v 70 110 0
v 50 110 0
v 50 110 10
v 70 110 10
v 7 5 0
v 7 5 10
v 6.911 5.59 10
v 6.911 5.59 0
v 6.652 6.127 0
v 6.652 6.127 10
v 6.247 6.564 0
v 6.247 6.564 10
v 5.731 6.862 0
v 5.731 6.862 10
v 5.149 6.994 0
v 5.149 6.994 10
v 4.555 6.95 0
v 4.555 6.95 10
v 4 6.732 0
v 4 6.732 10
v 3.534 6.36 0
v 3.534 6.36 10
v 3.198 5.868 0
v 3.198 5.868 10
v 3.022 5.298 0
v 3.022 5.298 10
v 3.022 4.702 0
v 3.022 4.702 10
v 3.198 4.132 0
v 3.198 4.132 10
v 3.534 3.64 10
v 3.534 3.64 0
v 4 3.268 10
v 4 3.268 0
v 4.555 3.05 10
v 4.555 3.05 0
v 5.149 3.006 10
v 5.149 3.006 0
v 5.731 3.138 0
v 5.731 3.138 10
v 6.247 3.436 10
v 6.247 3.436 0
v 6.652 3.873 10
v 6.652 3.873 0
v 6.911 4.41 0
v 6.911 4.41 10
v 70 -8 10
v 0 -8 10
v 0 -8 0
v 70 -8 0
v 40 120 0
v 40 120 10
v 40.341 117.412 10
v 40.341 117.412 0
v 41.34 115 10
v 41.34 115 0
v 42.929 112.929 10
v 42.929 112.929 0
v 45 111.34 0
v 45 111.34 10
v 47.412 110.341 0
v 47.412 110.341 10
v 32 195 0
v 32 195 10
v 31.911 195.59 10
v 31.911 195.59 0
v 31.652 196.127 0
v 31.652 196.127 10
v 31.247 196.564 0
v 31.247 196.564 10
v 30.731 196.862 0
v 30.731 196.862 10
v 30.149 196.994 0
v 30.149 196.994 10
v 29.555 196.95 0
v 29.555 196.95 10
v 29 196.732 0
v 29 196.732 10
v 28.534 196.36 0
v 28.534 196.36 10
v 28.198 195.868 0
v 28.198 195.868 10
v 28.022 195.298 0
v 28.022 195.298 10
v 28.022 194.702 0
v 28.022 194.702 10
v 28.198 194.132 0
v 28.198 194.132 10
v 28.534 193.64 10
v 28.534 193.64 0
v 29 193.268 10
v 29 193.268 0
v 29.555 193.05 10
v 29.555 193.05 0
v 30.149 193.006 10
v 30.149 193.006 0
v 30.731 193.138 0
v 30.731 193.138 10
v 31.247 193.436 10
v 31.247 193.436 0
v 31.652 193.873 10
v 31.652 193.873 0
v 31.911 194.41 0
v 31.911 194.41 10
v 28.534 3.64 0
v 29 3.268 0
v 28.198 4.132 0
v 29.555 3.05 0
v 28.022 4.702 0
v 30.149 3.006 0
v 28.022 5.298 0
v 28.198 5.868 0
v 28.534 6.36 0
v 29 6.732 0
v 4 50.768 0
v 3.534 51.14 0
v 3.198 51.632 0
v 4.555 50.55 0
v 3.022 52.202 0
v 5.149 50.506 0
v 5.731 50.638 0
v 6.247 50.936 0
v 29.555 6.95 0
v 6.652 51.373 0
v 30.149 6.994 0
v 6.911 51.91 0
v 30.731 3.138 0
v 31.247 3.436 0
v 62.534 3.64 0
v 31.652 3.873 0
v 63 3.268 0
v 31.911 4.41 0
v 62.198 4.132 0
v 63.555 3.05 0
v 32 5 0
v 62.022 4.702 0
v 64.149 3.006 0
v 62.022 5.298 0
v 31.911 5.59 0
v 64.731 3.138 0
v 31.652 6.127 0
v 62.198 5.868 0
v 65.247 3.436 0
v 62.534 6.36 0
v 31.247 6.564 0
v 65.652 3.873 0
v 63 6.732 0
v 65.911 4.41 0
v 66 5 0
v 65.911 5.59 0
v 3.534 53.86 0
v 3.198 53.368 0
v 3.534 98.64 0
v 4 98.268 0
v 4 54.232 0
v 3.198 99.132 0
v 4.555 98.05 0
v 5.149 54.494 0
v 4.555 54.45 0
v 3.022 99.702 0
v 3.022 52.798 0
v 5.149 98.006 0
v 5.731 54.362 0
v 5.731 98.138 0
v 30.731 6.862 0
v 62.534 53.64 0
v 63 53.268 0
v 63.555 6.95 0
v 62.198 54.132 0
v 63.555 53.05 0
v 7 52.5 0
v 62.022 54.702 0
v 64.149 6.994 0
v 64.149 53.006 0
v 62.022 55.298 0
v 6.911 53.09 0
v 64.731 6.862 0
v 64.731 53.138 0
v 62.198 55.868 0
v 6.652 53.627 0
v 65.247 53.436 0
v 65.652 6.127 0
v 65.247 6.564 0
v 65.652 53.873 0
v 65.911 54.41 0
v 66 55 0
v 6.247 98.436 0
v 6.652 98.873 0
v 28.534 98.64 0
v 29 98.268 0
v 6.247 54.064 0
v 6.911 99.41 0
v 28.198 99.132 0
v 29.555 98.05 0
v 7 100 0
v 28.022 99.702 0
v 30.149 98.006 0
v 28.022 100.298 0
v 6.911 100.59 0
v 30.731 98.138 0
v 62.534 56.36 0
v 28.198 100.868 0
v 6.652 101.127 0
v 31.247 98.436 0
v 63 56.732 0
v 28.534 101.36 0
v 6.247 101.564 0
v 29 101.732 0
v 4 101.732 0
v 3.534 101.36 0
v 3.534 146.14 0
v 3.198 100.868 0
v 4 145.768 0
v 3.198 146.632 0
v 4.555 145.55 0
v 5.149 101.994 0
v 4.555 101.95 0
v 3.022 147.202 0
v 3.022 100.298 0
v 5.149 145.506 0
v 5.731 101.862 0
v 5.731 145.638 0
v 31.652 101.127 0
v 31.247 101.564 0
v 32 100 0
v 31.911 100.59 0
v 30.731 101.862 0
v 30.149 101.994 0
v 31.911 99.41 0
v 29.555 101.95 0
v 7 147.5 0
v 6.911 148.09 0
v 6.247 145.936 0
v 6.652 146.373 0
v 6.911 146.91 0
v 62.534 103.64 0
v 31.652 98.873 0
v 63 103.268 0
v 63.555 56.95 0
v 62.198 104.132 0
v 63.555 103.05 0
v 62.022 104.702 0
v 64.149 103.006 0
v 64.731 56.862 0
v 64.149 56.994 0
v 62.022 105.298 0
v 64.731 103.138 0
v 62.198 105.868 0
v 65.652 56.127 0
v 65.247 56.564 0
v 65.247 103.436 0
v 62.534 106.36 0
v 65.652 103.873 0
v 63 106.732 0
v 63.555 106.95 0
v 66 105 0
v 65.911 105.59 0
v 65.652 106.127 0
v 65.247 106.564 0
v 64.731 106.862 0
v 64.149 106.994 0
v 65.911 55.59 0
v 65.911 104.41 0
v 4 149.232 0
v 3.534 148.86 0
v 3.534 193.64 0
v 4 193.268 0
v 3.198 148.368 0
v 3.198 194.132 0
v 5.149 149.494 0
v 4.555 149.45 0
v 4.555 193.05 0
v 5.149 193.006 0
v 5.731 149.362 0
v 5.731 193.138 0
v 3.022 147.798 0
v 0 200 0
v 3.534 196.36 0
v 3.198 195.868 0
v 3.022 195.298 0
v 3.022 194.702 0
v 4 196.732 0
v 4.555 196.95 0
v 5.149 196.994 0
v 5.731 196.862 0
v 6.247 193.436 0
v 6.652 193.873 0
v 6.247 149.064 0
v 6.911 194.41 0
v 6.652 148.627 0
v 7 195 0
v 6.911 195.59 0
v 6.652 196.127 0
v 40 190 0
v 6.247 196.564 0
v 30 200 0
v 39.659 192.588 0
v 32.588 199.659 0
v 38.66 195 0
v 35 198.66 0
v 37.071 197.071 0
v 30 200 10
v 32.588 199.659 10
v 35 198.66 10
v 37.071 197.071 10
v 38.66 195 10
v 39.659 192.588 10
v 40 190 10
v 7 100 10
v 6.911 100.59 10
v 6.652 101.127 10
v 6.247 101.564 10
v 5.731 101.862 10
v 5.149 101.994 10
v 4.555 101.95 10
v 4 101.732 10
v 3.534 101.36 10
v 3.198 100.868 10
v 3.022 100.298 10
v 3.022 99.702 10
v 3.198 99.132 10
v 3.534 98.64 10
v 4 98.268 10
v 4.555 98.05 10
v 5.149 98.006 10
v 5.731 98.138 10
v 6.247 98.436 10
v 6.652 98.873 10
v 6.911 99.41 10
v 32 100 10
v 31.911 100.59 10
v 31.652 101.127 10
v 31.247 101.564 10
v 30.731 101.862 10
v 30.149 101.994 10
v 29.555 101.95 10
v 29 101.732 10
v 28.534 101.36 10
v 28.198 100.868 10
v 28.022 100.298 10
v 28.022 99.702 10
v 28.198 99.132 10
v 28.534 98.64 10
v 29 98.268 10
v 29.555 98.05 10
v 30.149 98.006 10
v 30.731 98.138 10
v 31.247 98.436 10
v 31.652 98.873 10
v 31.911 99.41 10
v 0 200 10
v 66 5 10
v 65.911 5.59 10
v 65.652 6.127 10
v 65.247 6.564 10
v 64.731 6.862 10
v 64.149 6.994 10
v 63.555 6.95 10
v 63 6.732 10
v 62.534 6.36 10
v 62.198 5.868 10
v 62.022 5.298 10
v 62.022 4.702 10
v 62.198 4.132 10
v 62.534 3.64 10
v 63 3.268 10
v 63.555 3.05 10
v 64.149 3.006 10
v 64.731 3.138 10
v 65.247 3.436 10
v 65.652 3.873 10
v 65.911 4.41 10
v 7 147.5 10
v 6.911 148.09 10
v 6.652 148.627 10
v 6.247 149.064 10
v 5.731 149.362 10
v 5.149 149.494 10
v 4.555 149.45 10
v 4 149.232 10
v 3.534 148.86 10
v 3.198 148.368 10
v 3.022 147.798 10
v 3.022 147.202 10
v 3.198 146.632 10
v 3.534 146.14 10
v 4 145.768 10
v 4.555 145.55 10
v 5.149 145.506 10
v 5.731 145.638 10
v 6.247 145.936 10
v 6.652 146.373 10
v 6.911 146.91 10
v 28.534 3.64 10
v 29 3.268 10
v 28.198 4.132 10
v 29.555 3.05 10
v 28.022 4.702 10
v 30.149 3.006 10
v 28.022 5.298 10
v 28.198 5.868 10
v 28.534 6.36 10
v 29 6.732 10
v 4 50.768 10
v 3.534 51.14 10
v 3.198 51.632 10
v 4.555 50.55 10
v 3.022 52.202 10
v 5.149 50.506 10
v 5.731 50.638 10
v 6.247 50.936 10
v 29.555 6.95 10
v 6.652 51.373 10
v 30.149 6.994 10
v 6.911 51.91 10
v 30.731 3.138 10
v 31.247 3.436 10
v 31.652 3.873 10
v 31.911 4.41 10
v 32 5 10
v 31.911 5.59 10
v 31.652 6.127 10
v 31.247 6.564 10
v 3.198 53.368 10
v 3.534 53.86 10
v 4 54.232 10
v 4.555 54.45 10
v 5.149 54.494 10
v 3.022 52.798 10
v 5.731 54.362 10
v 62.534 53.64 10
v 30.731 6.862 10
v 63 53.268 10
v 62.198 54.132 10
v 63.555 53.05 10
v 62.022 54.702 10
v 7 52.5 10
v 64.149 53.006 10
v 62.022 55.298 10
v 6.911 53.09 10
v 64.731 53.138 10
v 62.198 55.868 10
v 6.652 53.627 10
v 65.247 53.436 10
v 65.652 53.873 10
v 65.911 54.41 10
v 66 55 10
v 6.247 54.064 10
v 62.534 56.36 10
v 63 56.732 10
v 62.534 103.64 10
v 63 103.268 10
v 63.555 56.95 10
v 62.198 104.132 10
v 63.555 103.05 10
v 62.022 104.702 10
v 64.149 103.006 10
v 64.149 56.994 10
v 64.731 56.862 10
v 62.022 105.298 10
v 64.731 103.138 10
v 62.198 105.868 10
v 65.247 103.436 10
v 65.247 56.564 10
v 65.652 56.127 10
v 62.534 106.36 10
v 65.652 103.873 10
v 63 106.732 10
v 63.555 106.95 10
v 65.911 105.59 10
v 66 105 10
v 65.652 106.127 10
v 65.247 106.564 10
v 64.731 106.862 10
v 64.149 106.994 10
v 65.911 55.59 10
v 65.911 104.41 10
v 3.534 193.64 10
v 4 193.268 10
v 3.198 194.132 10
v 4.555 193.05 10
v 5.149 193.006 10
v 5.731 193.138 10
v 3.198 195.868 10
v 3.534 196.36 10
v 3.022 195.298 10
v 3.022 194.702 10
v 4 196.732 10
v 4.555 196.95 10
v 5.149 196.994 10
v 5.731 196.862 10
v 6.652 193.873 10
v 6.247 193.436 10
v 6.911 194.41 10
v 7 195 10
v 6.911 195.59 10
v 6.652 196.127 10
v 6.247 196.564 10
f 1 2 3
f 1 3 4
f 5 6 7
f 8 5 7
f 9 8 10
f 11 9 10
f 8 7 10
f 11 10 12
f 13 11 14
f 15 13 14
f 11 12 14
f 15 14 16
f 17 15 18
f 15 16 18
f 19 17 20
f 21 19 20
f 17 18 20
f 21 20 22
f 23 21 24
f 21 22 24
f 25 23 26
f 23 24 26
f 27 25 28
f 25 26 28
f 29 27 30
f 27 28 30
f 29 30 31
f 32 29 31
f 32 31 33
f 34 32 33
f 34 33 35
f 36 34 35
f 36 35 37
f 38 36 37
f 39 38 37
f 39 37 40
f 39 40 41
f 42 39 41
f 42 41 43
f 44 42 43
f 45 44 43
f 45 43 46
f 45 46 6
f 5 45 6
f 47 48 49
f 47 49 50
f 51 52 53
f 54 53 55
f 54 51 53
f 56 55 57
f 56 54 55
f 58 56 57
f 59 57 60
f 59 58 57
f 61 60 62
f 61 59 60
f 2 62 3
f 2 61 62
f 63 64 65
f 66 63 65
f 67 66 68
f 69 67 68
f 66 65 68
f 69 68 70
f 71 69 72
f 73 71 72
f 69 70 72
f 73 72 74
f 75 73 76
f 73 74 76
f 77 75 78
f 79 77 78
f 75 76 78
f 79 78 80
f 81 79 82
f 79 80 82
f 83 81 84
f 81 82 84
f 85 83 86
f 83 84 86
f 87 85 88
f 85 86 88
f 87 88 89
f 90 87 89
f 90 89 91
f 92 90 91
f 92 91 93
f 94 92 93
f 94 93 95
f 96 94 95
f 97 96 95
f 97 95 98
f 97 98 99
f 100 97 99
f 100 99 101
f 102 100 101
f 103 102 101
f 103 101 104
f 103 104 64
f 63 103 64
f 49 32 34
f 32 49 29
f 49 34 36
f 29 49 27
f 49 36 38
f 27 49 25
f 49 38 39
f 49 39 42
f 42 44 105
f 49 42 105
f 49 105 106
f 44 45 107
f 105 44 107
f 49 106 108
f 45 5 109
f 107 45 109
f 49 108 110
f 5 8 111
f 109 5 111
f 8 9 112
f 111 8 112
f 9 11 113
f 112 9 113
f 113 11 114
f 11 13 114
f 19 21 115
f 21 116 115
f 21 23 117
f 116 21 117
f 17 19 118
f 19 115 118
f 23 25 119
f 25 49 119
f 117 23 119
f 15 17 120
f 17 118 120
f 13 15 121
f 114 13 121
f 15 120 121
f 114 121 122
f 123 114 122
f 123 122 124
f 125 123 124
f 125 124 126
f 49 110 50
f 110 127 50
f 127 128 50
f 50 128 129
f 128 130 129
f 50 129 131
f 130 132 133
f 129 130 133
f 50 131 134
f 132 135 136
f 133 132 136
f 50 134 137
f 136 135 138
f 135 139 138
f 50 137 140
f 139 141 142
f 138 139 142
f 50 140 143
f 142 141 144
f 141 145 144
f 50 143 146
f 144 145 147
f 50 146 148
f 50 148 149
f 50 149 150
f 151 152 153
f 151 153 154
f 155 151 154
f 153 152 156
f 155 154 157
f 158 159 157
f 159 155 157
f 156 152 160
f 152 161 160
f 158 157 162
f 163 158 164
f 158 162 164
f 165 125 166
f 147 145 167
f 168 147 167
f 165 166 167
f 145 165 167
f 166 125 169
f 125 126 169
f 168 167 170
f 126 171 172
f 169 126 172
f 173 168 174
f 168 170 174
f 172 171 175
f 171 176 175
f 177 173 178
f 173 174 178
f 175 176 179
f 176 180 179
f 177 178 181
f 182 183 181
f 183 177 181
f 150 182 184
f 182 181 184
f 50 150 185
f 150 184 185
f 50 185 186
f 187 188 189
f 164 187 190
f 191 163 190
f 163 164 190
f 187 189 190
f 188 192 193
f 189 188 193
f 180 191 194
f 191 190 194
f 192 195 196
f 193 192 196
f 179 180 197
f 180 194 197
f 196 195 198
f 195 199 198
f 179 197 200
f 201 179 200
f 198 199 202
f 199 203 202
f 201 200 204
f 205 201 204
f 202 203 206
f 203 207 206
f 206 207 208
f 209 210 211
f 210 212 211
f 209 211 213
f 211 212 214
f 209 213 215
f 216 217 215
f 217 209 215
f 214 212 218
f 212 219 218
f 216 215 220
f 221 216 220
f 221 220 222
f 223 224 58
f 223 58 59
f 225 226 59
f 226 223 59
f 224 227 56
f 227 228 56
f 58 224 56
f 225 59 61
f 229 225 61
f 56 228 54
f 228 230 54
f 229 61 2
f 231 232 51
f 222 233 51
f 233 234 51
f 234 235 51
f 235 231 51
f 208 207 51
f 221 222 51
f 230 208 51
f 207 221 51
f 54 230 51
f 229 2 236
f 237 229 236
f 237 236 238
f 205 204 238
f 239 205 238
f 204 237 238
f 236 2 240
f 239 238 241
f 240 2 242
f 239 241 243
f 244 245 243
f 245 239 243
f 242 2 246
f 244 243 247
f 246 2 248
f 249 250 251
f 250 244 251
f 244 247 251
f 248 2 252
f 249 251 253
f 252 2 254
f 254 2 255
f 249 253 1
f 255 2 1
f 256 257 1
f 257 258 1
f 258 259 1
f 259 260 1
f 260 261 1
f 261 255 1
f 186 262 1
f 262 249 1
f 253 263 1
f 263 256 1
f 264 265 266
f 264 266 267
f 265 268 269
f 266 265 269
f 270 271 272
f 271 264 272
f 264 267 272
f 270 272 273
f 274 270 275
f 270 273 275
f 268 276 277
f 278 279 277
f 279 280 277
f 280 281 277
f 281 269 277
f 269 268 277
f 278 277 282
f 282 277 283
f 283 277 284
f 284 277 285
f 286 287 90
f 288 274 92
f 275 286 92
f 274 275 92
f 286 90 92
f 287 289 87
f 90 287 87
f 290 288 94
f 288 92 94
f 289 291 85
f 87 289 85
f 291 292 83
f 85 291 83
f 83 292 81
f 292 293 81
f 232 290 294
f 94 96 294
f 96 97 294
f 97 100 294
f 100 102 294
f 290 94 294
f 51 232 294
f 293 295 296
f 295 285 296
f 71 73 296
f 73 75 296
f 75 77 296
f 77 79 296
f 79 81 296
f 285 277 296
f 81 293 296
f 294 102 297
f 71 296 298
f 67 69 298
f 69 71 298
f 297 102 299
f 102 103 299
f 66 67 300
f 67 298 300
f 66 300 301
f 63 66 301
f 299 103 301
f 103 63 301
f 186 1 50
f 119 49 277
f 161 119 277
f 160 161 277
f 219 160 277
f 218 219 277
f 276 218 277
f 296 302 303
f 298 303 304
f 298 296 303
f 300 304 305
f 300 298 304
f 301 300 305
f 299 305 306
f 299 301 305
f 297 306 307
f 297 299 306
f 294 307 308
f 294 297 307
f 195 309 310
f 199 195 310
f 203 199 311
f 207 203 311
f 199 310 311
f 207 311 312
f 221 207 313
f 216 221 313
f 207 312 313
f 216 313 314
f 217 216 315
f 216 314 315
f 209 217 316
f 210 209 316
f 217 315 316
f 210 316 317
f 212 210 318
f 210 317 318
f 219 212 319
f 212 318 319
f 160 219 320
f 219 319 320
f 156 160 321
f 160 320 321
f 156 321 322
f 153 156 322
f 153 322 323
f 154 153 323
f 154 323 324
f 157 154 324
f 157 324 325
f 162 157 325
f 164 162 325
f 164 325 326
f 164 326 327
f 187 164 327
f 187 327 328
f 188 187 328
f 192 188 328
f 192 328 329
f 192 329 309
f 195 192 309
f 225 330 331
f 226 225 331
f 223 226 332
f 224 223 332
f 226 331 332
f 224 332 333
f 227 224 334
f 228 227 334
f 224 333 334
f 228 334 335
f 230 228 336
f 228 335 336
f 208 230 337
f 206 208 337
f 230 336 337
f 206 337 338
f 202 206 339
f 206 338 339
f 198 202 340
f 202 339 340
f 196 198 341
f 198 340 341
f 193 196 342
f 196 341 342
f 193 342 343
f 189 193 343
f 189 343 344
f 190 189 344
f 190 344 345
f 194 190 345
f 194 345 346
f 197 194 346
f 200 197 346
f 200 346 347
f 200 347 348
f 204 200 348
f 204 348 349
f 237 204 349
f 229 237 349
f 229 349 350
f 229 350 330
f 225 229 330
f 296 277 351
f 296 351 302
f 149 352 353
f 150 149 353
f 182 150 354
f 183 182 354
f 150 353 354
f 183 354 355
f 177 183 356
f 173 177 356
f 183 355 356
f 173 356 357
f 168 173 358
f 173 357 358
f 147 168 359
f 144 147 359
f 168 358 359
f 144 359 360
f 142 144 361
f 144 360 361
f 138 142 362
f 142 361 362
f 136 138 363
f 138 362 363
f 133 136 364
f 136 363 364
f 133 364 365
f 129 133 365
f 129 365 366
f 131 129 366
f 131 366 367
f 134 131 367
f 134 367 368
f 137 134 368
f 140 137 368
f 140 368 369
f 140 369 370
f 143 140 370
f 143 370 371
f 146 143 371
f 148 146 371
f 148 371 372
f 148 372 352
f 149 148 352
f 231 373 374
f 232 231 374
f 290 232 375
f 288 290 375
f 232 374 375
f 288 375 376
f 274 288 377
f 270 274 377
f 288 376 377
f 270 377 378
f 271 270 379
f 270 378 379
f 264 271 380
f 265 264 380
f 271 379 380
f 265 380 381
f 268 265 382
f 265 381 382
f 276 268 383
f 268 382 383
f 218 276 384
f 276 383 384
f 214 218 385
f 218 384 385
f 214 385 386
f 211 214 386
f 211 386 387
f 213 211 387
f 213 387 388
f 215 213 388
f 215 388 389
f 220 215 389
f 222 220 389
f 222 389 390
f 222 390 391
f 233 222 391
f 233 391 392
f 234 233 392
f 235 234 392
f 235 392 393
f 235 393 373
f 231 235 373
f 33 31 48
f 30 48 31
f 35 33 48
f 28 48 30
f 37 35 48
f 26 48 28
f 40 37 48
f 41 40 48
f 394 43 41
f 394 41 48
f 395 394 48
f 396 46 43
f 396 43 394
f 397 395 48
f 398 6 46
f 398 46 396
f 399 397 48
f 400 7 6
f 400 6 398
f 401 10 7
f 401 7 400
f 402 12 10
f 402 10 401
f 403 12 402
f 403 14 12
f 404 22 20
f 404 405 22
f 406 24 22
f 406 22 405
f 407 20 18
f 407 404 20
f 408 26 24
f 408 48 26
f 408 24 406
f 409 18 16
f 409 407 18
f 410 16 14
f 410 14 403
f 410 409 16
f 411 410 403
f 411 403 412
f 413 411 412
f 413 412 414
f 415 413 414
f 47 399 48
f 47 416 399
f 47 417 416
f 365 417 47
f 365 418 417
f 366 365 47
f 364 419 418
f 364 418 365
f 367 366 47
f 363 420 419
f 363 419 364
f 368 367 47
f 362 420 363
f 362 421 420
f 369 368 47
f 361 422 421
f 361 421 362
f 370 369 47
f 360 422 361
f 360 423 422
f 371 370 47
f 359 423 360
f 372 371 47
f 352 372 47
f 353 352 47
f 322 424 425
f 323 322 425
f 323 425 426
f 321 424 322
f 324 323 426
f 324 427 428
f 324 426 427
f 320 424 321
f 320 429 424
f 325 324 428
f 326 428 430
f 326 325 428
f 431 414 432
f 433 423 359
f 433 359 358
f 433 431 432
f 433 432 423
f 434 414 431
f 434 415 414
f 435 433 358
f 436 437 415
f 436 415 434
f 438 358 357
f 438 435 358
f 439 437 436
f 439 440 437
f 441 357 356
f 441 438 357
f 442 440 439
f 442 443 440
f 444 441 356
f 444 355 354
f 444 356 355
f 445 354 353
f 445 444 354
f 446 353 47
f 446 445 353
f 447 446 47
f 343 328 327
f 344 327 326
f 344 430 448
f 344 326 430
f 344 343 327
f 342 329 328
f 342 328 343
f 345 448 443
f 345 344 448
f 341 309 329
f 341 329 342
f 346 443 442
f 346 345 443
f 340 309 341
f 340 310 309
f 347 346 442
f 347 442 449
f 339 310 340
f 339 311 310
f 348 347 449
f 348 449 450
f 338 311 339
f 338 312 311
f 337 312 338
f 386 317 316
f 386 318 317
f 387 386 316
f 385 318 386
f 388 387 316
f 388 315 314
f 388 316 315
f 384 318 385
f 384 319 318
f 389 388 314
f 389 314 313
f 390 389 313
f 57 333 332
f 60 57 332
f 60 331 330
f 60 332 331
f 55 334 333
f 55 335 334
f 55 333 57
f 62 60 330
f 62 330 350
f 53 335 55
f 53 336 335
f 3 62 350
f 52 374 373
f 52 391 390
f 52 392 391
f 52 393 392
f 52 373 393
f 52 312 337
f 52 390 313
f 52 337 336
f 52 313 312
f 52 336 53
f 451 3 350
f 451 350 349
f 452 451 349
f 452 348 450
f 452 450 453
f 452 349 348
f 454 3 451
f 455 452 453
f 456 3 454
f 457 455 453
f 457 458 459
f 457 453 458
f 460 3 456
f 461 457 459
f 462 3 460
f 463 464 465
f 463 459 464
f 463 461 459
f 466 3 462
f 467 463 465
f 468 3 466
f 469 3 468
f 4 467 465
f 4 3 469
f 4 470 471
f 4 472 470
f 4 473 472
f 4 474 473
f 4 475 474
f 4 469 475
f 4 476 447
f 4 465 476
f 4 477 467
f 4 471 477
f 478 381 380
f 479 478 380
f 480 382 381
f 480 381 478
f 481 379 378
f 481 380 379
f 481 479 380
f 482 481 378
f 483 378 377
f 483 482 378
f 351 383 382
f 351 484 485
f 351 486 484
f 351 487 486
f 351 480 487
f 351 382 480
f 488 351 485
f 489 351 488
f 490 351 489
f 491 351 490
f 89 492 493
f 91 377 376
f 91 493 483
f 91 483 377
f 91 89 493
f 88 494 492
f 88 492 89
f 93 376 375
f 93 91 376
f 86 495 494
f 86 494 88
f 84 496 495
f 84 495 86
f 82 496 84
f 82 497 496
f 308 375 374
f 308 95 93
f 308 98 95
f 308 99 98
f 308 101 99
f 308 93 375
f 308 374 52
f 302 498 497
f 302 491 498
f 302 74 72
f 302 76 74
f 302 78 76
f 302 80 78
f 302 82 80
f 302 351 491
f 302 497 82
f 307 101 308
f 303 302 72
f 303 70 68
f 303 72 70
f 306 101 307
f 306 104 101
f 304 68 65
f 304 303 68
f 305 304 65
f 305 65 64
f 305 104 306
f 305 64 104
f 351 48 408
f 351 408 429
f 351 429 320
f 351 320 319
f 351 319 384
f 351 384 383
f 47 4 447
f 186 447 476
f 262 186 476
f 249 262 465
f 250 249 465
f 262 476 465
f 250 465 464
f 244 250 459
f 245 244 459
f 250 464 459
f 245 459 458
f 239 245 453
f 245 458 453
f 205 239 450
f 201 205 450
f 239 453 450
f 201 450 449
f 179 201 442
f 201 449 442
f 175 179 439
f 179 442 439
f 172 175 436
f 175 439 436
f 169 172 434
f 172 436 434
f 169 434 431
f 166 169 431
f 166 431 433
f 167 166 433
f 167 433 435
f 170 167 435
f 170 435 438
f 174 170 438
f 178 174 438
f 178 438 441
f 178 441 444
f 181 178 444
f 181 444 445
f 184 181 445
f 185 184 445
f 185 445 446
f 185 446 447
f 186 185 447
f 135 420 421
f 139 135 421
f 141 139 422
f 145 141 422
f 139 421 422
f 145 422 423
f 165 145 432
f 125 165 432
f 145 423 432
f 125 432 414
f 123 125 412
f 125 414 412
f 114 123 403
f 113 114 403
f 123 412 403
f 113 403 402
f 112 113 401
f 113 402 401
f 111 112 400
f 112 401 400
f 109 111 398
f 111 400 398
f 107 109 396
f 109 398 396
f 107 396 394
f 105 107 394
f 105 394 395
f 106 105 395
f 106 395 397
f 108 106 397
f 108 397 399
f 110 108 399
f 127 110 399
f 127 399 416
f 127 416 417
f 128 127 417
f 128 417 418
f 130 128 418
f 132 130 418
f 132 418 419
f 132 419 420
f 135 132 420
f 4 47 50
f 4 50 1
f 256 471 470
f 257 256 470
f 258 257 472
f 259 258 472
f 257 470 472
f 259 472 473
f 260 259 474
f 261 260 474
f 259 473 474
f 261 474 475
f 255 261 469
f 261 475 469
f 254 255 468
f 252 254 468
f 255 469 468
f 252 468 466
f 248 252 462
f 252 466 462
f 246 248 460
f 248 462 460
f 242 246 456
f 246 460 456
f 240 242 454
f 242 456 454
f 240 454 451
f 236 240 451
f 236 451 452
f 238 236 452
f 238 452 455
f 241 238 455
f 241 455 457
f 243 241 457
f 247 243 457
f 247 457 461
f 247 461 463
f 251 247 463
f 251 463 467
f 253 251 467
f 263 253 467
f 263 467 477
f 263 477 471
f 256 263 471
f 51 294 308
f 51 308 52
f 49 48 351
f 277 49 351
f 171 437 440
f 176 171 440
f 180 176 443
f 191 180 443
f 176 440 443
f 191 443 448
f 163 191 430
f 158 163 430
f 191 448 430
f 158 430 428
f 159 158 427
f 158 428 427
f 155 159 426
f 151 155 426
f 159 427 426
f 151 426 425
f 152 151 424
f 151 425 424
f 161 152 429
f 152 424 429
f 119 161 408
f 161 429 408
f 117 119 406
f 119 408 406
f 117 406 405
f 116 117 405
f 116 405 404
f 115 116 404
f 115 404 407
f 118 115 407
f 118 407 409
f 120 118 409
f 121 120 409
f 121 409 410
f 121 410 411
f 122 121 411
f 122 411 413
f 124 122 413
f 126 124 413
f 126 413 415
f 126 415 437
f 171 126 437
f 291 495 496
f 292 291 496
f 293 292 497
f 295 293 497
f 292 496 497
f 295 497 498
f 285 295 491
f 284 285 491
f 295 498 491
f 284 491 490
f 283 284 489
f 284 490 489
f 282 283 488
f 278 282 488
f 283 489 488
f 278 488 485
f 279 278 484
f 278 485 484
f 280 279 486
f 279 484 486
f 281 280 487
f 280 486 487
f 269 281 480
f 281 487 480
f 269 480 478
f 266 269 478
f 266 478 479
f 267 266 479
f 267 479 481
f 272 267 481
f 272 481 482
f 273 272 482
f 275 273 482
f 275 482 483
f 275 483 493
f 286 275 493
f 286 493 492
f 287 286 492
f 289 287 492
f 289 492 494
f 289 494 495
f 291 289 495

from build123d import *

# Parameters (mm, degrees)
SALIENTE_EXTRUIR1_DEPTH = 10
CROQUIS2_R              = 2
CORTAR_EXTRUIR1_DEPTH   = 213.132034356
CROQUIS3_W              = 70
CROQUIS3_H              = 8
SALIENTE_EXTRUIR2_DEPTH = 10


with BuildPart() as part:
    # Croquis1 → Saliente-Extruir1 (new body)
    with BuildSketch(Plane.XY):
        with BuildLine():
            Line((0, 0), (0, 200))
            Line((0, 200), (30, 200))
            ThreePointArc((30, 200), (37.071067812, 197.071067812), (40, 190))
            Line((40, 190), (40, 120))
            ThreePointArc((40, 120), (42.928932188, 112.928932188), (50, 110))
            Line((50, 110), (70, 110))
            Line((70, 110), (70, 0))
            Line((70, 0), (0, 0))
        make_face()
    extrude(amount=SALIENTE_EXTRUIR1_DEPTH)

    # Croquis2 → Cortar-Extruir1 (cut, through all)
    with BuildSketch(Plane.XY.offset(10)):
        with Locations((5, 195)):
            Circle(CROQUIS2_R)
        with Locations((5, 147.5)):
            Circle(CROQUIS2_R)
        with Locations((5, 100)):
            Circle(CROQUIS2_R)
        with Locations((5, 52.5)):
            Circle(CROQUIS2_R)
        with Locations((5, 5)):
            Circle(CROQUIS2_R)
        with Locations((64, 105)):
            Circle(CROQUIS2_R)
        with Locations((64, 55)):
            Circle(CROQUIS2_R)
        with Locations((64, 5)):
            Circle(CROQUIS2_R)
        with Locations((30, 195)):
            Circle(CROQUIS2_R)
        with Locations((30, 100)):
            Circle(CROQUIS2_R)
        with Locations((30, 5)):
            Circle(CROQUIS2_R)
    extrude(amount=-CORTAR_EXTRUIR1_DEPTH, mode=Mode.SUBTRACT)

    # Croquis3 → Saliente-Extruir2 (add)
    with BuildSketch(Plane.XY.offset(10)):
        with Locations((35, -4)):
            Rectangle(CROQUIS3_W, CROQUIS3_H)
    extrude(amount=-SALIENTE_EXTRUIR2_DEPTH)


solid = part.part
